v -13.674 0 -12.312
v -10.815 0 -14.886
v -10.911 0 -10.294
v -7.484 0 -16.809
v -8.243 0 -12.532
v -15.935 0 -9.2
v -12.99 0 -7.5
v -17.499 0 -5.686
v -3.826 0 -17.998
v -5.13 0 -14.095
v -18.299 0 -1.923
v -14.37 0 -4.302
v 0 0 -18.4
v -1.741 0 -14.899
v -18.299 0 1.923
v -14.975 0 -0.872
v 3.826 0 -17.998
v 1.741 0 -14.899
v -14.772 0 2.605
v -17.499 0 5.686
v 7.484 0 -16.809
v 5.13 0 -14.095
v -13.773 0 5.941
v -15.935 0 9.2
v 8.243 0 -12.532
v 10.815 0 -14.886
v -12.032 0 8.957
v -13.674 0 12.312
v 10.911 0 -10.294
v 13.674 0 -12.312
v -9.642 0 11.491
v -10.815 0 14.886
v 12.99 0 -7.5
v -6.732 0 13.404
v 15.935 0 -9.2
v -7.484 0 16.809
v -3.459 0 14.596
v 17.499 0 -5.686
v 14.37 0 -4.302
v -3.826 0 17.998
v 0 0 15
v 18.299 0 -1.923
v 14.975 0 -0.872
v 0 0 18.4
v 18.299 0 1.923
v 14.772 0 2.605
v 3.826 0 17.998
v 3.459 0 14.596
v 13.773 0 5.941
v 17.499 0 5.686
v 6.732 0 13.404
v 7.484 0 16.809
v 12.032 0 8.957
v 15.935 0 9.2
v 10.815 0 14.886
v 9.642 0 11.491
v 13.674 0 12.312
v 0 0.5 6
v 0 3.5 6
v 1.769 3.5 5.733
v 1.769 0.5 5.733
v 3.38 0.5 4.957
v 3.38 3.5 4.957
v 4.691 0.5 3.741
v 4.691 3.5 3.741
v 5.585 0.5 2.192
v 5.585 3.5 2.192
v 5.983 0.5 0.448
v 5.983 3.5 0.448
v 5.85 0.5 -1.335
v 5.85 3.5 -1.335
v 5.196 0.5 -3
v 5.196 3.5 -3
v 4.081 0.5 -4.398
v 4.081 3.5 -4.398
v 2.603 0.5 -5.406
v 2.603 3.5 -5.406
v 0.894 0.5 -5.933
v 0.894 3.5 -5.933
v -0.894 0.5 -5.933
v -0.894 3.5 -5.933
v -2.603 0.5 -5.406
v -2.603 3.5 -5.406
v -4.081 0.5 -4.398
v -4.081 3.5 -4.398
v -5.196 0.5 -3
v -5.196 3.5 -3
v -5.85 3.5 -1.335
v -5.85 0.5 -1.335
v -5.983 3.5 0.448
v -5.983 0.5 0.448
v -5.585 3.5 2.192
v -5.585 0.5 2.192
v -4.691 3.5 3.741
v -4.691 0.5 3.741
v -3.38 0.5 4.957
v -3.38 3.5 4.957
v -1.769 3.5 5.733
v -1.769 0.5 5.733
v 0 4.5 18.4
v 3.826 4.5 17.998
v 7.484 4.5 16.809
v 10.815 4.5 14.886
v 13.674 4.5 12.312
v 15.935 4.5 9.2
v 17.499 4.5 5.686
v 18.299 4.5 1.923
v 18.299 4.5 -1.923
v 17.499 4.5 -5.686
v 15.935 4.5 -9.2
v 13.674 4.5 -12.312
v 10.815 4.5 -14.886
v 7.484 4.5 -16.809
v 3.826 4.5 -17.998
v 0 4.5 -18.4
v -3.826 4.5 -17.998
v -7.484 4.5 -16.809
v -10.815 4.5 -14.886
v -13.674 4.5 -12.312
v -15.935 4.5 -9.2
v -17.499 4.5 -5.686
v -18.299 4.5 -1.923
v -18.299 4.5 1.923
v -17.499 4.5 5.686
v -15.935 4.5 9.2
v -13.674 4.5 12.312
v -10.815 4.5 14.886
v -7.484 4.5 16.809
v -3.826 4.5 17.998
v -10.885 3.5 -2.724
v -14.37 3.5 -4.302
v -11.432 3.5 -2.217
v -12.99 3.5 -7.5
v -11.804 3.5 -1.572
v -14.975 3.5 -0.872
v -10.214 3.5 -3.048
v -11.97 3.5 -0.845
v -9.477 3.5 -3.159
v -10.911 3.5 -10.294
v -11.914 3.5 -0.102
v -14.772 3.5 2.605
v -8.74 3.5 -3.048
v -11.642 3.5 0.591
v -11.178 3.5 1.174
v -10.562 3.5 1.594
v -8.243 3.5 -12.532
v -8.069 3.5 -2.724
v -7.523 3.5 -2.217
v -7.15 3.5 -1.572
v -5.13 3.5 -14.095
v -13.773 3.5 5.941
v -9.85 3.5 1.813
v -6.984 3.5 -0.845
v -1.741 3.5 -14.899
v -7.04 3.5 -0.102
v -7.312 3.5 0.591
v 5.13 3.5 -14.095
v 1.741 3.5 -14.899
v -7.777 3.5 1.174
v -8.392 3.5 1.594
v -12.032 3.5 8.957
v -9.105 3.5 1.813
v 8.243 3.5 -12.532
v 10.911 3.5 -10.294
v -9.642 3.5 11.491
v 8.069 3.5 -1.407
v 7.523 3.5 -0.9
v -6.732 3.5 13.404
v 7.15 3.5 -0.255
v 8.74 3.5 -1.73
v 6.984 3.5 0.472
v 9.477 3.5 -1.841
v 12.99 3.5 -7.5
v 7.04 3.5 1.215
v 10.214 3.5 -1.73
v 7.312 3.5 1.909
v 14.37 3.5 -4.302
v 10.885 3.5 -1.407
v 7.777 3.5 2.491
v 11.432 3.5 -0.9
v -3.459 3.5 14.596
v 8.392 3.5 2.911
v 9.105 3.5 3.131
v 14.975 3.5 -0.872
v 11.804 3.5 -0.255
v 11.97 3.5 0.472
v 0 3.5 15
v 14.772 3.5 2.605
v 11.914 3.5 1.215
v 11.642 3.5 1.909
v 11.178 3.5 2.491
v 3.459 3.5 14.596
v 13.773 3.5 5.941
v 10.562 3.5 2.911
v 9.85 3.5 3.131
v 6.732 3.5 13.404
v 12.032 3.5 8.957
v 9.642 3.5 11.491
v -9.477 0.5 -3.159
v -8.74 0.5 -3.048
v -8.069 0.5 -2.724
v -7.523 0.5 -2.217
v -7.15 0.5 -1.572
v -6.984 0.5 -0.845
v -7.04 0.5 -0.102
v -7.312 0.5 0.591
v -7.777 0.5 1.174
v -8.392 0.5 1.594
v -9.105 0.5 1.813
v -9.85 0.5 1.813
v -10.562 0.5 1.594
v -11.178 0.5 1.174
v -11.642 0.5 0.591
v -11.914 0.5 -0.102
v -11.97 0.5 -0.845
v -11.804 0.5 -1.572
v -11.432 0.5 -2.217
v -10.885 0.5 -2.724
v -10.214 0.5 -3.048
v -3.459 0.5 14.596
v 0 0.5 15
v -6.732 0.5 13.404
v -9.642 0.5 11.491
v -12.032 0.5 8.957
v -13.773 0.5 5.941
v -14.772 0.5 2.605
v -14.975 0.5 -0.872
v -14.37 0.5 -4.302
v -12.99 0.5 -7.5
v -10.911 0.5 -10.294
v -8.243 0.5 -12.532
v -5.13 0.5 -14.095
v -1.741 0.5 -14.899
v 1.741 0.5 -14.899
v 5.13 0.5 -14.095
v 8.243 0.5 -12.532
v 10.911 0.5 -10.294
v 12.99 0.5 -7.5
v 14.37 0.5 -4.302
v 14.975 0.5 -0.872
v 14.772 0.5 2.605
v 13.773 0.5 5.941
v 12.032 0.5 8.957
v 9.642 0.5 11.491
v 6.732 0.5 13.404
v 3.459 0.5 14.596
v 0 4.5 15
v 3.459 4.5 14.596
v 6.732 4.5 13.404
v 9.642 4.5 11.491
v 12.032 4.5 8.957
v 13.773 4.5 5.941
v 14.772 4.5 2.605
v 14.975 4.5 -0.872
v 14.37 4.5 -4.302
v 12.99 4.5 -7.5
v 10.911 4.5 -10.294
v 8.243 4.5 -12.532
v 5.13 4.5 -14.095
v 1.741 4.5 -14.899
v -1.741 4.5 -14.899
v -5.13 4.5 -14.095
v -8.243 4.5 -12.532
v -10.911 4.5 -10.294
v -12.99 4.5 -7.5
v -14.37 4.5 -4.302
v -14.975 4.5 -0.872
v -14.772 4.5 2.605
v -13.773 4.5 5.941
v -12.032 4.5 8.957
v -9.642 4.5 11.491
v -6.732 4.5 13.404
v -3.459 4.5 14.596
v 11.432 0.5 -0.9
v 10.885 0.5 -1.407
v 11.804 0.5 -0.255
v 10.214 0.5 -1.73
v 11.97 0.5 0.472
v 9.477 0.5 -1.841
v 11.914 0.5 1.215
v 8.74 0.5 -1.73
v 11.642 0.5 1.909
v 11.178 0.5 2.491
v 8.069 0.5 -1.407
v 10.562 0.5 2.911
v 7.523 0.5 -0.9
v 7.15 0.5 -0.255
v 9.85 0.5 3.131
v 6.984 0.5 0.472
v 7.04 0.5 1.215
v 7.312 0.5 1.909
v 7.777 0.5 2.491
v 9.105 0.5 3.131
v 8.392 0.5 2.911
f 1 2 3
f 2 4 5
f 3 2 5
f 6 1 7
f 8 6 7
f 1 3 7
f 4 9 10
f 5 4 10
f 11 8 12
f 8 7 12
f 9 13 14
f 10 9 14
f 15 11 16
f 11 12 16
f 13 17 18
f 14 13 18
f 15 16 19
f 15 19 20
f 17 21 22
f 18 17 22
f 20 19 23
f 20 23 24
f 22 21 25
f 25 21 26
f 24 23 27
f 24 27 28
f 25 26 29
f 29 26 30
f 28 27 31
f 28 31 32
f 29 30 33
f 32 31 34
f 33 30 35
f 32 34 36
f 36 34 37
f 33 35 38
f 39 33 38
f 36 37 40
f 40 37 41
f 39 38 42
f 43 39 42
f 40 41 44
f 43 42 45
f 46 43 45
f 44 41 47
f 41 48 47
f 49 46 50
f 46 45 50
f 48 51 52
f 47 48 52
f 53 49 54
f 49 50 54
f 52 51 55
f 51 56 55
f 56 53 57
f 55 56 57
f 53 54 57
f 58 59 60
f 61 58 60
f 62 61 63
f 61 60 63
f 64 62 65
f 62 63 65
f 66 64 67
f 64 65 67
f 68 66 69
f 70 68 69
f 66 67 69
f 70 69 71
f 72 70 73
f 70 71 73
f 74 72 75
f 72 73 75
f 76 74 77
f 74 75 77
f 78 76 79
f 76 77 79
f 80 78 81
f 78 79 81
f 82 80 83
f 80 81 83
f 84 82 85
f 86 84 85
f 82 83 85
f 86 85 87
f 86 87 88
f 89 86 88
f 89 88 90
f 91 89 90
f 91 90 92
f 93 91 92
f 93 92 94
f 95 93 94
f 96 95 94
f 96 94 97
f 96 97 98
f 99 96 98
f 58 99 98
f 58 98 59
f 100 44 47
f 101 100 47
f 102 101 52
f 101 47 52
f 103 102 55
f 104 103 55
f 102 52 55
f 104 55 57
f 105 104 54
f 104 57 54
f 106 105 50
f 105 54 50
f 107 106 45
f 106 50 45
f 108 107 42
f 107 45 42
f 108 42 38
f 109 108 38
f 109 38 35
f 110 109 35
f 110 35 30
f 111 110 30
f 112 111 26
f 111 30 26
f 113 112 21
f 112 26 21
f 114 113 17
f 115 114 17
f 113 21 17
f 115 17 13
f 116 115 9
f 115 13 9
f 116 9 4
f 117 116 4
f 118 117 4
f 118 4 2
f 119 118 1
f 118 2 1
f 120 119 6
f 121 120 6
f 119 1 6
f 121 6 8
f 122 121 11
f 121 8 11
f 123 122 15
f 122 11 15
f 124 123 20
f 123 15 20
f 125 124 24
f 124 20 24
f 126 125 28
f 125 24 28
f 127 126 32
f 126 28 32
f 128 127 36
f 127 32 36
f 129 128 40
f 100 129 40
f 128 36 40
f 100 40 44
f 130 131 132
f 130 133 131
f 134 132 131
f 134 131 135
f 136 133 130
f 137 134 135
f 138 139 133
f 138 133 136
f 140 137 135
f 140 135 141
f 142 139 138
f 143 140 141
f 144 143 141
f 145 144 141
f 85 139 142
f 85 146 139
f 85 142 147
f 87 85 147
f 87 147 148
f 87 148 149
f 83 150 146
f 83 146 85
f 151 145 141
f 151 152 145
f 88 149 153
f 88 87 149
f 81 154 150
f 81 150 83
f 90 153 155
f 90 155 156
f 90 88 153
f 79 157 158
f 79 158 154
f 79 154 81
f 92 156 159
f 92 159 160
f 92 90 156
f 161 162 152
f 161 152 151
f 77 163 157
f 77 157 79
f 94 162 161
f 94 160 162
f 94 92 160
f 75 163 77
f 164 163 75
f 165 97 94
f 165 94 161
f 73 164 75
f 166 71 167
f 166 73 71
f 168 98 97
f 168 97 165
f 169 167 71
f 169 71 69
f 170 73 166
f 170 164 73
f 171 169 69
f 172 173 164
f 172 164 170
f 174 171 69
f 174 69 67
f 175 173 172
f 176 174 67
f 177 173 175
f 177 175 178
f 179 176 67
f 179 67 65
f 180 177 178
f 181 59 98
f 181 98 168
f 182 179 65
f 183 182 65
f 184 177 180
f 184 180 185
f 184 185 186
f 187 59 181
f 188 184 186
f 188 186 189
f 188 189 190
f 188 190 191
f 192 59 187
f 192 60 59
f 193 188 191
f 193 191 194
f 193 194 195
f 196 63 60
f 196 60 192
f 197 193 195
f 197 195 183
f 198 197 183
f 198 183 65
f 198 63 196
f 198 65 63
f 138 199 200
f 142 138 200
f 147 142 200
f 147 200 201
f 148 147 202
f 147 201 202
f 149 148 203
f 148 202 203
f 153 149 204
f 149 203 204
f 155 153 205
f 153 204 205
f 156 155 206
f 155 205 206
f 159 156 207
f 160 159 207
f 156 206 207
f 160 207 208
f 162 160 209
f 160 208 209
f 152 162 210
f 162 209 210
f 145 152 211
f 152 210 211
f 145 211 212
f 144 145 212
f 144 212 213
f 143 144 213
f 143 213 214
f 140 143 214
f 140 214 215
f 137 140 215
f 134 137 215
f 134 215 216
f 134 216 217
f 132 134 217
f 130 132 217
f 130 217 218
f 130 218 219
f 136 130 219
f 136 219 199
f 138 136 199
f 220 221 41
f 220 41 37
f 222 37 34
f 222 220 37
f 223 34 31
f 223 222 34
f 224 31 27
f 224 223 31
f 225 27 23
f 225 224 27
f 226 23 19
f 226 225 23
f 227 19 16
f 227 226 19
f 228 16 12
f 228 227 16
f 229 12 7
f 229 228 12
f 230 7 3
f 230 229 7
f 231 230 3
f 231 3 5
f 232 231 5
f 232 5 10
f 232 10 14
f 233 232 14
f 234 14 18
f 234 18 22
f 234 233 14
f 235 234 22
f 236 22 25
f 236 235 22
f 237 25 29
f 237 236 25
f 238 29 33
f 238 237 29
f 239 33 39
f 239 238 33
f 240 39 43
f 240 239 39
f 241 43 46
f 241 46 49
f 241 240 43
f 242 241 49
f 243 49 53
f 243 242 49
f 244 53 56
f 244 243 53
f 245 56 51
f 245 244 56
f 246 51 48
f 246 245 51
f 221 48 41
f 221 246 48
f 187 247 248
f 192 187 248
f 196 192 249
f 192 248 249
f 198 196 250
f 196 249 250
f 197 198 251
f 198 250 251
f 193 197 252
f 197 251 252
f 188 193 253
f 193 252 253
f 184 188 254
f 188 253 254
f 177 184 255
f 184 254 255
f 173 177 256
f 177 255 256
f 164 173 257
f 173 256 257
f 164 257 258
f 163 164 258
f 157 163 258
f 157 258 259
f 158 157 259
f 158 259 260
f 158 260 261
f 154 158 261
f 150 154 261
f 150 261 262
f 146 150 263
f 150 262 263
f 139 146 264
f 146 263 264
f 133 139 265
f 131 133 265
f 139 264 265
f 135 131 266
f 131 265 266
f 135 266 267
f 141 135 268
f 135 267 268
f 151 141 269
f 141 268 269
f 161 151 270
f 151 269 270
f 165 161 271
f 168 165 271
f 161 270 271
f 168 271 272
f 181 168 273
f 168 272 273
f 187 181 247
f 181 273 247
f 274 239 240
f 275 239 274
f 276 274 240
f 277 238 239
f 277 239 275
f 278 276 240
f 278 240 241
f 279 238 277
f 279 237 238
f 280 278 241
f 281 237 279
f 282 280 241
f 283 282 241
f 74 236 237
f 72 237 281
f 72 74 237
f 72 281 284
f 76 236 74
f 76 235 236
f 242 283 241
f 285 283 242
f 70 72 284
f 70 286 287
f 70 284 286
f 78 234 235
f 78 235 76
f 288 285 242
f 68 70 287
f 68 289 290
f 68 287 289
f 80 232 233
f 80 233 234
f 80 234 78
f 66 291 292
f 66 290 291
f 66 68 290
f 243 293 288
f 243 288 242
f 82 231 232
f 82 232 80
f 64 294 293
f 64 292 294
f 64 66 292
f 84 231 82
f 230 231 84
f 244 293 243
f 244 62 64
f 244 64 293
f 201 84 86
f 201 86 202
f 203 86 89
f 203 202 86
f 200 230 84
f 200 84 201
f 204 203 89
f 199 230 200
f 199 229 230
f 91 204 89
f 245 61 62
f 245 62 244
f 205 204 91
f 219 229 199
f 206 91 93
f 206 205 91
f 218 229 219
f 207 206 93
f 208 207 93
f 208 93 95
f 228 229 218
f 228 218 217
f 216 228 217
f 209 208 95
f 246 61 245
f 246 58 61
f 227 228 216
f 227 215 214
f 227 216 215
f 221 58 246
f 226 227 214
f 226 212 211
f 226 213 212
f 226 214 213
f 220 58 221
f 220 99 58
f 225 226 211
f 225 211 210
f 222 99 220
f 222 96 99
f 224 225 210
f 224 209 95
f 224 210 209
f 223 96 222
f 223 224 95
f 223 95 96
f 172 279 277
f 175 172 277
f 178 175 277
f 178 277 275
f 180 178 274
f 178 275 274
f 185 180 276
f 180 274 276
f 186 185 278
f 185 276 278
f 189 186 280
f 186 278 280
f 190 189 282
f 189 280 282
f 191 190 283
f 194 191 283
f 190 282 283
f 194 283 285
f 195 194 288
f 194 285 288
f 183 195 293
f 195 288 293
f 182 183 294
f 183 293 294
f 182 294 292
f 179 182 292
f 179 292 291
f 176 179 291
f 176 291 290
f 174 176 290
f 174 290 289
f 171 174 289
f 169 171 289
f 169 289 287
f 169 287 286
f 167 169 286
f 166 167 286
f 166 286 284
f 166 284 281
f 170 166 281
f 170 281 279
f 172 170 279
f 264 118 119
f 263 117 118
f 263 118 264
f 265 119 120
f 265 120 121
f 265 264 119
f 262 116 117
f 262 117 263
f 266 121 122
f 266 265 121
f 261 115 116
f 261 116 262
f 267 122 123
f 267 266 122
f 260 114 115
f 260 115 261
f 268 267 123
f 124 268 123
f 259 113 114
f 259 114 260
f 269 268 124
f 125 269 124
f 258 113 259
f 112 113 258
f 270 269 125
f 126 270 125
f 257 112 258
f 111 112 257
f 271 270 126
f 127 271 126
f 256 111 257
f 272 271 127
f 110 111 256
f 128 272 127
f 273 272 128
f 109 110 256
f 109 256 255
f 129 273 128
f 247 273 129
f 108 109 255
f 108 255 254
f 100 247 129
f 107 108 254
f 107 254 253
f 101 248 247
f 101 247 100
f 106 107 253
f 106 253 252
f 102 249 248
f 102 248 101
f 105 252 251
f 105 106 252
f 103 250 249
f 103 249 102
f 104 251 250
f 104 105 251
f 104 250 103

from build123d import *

# Parameters (mm, degrees)
SKETCH1_R           = 18.4
BOSS_EXTRUDE1_DEPTH = 4.5
SKETCH2_R           = 15
CUT_EXTRUDE1_DEPTH  = 1
SKETCH3_R           = 2.5
CUT_EXTRUDE2_DEPTH  = 27.40776401
CUT_EXTRUDE3_START  = -0.5
SKETCH4_R           = 15
CUT_EXTRUDE3_DEPTH  = 0.5
SKETCH5_R           = 6
CUT_EXTRUDE4_DEPTH  = 27.25585649


with BuildPart() as part:
    # Sketch1 → Boss-Extrude1 (new body)
    with BuildSketch(Plane(origin=(0, 0, 0), x_dir=(1, 0, 0), z_dir=(0, 1, 0))):
        with Locations(Location((0, 0, 0), (0, 0, 270))):
            Circle(SKETCH1_R)
    extrude(amount=BOSS_EXTRUDE1_DEPTH)

    # Sketch2 → Cut-Extrude1 (cut)
    with BuildSketch(Plane(origin=(0, 4.5, 0), x_dir=(1, 0, 0), z_dir=(0, 1, 0))):
        with Locations(Location((0, 0, 0), (0, 0, 270))):
            Circle(SKETCH2_R)
    extrude(amount=-CUT_EXTRUDE1_DEPTH, mode=Mode.SUBTRACT)

    # Sketch3 → Cut-Extrude2 (cut, through all)
    with BuildSketch(Plane.XZ):
        with Locations(Location((-9.477141659, -0.658624302, 0), (0, 0, 270))):
            Circle(SKETCH3_R)
        with Locations(Location((9.477141659, 0.658624302, 0), (0, 0, 270))):
            Circle(SKETCH3_R)
    extrude(amount=-CUT_EXTRUDE2_DEPTH, mode=Mode.SUBTRACT)

    # Sketch4 → Cut-Extrude3 (cut)
    with BuildSketch(Plane.XZ.offset(CUT_EXTRUDE3_START)):
        with Locations(Location((0, 0, 0), (0, 0, 90))):
            Circle(SKETCH4_R)
    extrude(amount=CUT_EXTRUDE3_DEPTH, mode=Mode.SUBTRACT)

    # Sketch5 → Cut-Extrude4 (cut, through all)
    with BuildSketch(Plane(origin=(0, 3.5, 0), x_dir=(1, 0, 0), z_dir=(0, 1, 0))):
        with Locations(Location((0, 0, 0), (0, 0, 270))):
            Circle(SKETCH5_R)
    extrude(amount=-CUT_EXTRUDE4_DEPTH, mode=Mode.SUBTRACT)


solid = part.part
